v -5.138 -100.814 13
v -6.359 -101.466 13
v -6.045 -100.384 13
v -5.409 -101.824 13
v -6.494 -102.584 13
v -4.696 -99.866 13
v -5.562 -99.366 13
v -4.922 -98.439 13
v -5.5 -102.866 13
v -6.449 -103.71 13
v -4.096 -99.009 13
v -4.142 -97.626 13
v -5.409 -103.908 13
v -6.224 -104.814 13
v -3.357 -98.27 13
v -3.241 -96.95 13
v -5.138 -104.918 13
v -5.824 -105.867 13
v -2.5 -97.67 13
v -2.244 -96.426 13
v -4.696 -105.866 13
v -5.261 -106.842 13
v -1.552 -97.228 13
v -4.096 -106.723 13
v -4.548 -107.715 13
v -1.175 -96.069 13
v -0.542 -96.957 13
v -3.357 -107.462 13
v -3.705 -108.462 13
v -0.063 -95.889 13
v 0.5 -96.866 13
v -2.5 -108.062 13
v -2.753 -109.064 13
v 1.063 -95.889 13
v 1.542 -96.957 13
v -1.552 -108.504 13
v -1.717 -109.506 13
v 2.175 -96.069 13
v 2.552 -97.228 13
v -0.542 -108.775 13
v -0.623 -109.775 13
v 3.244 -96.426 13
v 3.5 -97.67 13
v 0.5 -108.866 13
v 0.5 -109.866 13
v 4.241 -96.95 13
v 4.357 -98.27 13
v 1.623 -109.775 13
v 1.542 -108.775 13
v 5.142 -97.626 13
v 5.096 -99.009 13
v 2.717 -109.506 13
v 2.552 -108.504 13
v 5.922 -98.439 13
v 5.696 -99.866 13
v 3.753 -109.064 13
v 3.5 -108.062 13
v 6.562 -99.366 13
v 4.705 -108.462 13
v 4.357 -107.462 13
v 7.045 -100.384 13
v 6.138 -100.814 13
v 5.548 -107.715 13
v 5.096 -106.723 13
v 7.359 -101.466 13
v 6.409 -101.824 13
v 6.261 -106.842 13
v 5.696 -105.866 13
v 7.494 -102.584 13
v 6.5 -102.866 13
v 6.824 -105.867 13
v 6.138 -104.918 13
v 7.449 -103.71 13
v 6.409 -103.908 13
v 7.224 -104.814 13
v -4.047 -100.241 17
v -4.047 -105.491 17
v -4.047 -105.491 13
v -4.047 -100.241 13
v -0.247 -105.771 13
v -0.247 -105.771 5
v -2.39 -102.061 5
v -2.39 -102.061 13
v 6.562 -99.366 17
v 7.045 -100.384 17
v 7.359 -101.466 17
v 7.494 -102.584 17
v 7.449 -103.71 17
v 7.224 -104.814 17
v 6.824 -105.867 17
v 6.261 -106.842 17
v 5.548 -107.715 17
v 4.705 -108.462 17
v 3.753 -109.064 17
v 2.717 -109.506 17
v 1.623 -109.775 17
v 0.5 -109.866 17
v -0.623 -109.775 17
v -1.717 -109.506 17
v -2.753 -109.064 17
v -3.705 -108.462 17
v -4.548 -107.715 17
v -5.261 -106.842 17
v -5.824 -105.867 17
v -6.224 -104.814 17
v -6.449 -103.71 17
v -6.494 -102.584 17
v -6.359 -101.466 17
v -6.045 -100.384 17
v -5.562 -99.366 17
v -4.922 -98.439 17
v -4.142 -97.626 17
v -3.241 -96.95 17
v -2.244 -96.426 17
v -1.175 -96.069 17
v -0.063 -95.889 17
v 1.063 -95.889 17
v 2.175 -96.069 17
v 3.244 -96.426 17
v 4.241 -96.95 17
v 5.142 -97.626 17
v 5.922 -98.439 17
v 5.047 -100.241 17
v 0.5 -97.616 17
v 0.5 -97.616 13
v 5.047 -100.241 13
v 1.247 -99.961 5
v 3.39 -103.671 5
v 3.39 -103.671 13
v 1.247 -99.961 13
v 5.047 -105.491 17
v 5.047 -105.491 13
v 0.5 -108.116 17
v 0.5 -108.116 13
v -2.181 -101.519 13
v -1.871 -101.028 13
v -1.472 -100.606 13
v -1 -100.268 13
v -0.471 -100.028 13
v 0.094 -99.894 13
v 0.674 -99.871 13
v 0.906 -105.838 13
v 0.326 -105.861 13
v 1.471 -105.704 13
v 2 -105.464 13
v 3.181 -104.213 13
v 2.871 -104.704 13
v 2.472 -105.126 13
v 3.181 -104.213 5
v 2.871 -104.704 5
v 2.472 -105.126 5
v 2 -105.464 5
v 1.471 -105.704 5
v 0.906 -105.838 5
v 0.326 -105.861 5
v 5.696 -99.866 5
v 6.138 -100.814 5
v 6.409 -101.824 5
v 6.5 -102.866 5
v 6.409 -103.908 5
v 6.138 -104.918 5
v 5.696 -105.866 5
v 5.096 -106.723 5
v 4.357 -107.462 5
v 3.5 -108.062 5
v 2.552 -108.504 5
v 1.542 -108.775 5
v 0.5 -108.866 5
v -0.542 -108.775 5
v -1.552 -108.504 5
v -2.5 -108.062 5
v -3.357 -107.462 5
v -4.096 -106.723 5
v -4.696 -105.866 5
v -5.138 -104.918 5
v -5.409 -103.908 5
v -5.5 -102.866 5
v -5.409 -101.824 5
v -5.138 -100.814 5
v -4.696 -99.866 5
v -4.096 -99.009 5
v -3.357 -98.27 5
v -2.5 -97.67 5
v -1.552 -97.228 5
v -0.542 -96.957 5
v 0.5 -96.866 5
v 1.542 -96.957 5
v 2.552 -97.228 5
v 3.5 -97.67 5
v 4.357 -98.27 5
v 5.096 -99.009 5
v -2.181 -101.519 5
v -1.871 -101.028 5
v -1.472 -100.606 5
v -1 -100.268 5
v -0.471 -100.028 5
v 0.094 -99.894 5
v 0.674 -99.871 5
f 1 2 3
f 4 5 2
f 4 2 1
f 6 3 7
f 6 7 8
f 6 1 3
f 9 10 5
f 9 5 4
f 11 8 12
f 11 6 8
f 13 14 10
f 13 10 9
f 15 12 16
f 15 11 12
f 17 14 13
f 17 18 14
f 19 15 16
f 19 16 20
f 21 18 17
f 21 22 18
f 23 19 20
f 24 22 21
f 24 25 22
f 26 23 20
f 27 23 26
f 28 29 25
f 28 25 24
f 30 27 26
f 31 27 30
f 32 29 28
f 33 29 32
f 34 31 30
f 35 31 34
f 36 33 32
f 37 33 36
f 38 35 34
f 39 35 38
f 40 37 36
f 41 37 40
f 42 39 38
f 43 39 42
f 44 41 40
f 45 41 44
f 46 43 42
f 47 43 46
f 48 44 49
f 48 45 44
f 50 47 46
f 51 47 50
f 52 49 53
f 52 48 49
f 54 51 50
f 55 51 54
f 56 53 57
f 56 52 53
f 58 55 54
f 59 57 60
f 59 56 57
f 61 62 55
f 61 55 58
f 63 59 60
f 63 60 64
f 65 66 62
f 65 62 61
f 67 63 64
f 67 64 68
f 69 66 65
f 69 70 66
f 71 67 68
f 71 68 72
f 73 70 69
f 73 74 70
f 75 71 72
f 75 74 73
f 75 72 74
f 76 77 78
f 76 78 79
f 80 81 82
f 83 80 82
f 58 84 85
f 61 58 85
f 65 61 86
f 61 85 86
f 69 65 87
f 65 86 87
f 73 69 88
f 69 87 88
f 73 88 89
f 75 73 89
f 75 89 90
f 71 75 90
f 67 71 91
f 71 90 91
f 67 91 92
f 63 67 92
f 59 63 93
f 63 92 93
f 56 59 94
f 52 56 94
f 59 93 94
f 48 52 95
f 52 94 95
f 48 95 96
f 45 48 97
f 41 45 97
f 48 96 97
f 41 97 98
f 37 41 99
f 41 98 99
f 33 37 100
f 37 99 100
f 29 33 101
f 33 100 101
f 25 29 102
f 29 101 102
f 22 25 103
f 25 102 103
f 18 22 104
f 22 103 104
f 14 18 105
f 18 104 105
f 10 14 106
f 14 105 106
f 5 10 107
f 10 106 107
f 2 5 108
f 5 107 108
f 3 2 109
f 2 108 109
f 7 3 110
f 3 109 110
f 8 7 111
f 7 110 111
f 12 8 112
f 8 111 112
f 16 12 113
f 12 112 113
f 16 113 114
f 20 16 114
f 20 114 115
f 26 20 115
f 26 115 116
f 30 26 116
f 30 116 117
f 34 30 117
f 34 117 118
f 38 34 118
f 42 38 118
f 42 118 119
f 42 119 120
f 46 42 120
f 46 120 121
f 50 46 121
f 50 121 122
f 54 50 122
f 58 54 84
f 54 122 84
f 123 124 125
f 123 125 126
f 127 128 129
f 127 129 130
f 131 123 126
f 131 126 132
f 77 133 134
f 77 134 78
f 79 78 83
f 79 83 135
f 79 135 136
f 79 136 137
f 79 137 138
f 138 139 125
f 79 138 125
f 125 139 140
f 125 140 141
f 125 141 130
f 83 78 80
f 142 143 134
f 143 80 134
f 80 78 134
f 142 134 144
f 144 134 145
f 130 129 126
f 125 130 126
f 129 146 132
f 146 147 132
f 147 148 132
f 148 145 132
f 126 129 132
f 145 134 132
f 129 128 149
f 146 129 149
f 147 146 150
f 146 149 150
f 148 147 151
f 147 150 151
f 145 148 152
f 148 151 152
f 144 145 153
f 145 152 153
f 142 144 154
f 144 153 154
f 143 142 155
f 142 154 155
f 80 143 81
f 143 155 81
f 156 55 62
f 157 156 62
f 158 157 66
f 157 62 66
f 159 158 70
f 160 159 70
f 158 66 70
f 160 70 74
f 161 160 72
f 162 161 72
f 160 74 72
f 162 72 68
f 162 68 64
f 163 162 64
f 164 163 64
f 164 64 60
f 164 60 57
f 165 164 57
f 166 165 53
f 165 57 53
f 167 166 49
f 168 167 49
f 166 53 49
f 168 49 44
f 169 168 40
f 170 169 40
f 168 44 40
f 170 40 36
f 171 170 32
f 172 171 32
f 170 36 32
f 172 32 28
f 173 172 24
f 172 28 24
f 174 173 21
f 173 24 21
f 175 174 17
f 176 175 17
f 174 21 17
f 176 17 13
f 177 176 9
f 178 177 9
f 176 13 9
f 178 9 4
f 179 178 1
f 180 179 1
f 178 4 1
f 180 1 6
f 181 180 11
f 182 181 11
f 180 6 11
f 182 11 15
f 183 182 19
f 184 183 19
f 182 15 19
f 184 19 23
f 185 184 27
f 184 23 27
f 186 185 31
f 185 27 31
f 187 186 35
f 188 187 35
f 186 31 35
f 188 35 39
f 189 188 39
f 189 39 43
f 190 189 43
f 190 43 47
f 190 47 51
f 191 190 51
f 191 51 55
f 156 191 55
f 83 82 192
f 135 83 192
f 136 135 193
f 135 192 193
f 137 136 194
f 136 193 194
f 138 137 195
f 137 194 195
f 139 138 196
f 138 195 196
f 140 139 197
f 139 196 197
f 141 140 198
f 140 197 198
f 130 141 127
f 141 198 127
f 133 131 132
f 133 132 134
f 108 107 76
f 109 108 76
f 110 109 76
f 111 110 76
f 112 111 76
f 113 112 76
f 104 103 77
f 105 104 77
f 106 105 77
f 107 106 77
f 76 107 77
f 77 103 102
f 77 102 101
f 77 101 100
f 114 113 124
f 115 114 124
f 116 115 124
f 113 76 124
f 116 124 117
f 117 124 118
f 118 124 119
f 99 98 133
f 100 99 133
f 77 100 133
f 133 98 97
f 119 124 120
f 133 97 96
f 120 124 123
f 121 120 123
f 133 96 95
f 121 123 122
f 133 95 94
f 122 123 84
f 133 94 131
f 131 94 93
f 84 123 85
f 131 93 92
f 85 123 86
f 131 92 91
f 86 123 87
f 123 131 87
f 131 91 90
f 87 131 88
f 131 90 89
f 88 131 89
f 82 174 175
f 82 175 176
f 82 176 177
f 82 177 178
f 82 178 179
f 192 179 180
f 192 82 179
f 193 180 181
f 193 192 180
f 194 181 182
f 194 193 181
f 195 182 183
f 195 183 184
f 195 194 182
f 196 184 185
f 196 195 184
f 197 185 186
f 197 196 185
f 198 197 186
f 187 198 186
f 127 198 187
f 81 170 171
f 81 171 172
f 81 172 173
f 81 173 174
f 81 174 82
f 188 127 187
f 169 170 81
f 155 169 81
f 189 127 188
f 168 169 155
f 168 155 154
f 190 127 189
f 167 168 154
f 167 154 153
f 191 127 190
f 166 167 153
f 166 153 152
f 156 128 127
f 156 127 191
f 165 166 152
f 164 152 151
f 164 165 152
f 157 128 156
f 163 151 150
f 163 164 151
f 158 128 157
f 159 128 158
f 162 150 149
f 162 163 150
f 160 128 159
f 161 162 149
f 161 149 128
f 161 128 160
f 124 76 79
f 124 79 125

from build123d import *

# Parameters (mm, degrees)
SKETCH159_R             = 7
PAD068_DEPTH            = 4
SKETCH160_R             = 6
PAD069_DEPTH            = 8
POCKET068_DEPTH         = 20
BODY020_ROLL_ANGLE      = 90
BODY020_PLACEMENT_ANGLE = 30


with BuildPart() as part:
    # Sketch159 → Pad068 (new body)
    with BuildSketch(Plane.XZ):
        Circle(SKETCH159_R)
        Polygon((5.25, 0), (2.625, 4.546633), (-2.625, 4.546633), (-5.25, 0), (-2.625, -4.546633), (2.625, -4.546633), align=None, mode=Mode.SUBTRACT)
    extrude(amount=PAD068_DEPTH)

    # Sketch160 (on Face9 of Pad068) → Pad069 (join)
    with BuildSketch(Plane.XZ.offset(4)):
        Circle(SKETCH160_R)
    extrude(amount=PAD069_DEPTH)

    # Sketch162 (on Face12 of Pad069) → Pocket068 (cut)
    with BuildSketch(Plane.XZ.offset(12)):
        with BuildLine():
            ThreePointArc((2.1, 2.142429), (0, 3), (-2.1, 2.142429))
            Line((-2.1, 2.142429), (-2.1, -2.142429))
            ThreePointArc((-2.1, -2.142429), (0, -3), (2.1, -2.142429))
            Line((2.1, 2.142429), (2.1, -2.142429))
        make_face()
    extrude(amount=-POCKET068_DEPTH, mode=Mode.SUBTRACT)


with BuildPart() as part_1:
    # Body020 roll: moved
    add(part.part.rotate(Axis((0, 0, 0), (1, 0, 0)), BODY020_ROLL_ANGLE))


with BuildPart() as part_2:
    # Body020 placement: moved
    add(part_1.part.moved(Location((0.5, -102.866025, 17))).rotate(Axis((0.5, -102.866025, 17), (0, 0, 1)), BODY020_PLACEMENT_ANGLE))


solid = part_2.part
